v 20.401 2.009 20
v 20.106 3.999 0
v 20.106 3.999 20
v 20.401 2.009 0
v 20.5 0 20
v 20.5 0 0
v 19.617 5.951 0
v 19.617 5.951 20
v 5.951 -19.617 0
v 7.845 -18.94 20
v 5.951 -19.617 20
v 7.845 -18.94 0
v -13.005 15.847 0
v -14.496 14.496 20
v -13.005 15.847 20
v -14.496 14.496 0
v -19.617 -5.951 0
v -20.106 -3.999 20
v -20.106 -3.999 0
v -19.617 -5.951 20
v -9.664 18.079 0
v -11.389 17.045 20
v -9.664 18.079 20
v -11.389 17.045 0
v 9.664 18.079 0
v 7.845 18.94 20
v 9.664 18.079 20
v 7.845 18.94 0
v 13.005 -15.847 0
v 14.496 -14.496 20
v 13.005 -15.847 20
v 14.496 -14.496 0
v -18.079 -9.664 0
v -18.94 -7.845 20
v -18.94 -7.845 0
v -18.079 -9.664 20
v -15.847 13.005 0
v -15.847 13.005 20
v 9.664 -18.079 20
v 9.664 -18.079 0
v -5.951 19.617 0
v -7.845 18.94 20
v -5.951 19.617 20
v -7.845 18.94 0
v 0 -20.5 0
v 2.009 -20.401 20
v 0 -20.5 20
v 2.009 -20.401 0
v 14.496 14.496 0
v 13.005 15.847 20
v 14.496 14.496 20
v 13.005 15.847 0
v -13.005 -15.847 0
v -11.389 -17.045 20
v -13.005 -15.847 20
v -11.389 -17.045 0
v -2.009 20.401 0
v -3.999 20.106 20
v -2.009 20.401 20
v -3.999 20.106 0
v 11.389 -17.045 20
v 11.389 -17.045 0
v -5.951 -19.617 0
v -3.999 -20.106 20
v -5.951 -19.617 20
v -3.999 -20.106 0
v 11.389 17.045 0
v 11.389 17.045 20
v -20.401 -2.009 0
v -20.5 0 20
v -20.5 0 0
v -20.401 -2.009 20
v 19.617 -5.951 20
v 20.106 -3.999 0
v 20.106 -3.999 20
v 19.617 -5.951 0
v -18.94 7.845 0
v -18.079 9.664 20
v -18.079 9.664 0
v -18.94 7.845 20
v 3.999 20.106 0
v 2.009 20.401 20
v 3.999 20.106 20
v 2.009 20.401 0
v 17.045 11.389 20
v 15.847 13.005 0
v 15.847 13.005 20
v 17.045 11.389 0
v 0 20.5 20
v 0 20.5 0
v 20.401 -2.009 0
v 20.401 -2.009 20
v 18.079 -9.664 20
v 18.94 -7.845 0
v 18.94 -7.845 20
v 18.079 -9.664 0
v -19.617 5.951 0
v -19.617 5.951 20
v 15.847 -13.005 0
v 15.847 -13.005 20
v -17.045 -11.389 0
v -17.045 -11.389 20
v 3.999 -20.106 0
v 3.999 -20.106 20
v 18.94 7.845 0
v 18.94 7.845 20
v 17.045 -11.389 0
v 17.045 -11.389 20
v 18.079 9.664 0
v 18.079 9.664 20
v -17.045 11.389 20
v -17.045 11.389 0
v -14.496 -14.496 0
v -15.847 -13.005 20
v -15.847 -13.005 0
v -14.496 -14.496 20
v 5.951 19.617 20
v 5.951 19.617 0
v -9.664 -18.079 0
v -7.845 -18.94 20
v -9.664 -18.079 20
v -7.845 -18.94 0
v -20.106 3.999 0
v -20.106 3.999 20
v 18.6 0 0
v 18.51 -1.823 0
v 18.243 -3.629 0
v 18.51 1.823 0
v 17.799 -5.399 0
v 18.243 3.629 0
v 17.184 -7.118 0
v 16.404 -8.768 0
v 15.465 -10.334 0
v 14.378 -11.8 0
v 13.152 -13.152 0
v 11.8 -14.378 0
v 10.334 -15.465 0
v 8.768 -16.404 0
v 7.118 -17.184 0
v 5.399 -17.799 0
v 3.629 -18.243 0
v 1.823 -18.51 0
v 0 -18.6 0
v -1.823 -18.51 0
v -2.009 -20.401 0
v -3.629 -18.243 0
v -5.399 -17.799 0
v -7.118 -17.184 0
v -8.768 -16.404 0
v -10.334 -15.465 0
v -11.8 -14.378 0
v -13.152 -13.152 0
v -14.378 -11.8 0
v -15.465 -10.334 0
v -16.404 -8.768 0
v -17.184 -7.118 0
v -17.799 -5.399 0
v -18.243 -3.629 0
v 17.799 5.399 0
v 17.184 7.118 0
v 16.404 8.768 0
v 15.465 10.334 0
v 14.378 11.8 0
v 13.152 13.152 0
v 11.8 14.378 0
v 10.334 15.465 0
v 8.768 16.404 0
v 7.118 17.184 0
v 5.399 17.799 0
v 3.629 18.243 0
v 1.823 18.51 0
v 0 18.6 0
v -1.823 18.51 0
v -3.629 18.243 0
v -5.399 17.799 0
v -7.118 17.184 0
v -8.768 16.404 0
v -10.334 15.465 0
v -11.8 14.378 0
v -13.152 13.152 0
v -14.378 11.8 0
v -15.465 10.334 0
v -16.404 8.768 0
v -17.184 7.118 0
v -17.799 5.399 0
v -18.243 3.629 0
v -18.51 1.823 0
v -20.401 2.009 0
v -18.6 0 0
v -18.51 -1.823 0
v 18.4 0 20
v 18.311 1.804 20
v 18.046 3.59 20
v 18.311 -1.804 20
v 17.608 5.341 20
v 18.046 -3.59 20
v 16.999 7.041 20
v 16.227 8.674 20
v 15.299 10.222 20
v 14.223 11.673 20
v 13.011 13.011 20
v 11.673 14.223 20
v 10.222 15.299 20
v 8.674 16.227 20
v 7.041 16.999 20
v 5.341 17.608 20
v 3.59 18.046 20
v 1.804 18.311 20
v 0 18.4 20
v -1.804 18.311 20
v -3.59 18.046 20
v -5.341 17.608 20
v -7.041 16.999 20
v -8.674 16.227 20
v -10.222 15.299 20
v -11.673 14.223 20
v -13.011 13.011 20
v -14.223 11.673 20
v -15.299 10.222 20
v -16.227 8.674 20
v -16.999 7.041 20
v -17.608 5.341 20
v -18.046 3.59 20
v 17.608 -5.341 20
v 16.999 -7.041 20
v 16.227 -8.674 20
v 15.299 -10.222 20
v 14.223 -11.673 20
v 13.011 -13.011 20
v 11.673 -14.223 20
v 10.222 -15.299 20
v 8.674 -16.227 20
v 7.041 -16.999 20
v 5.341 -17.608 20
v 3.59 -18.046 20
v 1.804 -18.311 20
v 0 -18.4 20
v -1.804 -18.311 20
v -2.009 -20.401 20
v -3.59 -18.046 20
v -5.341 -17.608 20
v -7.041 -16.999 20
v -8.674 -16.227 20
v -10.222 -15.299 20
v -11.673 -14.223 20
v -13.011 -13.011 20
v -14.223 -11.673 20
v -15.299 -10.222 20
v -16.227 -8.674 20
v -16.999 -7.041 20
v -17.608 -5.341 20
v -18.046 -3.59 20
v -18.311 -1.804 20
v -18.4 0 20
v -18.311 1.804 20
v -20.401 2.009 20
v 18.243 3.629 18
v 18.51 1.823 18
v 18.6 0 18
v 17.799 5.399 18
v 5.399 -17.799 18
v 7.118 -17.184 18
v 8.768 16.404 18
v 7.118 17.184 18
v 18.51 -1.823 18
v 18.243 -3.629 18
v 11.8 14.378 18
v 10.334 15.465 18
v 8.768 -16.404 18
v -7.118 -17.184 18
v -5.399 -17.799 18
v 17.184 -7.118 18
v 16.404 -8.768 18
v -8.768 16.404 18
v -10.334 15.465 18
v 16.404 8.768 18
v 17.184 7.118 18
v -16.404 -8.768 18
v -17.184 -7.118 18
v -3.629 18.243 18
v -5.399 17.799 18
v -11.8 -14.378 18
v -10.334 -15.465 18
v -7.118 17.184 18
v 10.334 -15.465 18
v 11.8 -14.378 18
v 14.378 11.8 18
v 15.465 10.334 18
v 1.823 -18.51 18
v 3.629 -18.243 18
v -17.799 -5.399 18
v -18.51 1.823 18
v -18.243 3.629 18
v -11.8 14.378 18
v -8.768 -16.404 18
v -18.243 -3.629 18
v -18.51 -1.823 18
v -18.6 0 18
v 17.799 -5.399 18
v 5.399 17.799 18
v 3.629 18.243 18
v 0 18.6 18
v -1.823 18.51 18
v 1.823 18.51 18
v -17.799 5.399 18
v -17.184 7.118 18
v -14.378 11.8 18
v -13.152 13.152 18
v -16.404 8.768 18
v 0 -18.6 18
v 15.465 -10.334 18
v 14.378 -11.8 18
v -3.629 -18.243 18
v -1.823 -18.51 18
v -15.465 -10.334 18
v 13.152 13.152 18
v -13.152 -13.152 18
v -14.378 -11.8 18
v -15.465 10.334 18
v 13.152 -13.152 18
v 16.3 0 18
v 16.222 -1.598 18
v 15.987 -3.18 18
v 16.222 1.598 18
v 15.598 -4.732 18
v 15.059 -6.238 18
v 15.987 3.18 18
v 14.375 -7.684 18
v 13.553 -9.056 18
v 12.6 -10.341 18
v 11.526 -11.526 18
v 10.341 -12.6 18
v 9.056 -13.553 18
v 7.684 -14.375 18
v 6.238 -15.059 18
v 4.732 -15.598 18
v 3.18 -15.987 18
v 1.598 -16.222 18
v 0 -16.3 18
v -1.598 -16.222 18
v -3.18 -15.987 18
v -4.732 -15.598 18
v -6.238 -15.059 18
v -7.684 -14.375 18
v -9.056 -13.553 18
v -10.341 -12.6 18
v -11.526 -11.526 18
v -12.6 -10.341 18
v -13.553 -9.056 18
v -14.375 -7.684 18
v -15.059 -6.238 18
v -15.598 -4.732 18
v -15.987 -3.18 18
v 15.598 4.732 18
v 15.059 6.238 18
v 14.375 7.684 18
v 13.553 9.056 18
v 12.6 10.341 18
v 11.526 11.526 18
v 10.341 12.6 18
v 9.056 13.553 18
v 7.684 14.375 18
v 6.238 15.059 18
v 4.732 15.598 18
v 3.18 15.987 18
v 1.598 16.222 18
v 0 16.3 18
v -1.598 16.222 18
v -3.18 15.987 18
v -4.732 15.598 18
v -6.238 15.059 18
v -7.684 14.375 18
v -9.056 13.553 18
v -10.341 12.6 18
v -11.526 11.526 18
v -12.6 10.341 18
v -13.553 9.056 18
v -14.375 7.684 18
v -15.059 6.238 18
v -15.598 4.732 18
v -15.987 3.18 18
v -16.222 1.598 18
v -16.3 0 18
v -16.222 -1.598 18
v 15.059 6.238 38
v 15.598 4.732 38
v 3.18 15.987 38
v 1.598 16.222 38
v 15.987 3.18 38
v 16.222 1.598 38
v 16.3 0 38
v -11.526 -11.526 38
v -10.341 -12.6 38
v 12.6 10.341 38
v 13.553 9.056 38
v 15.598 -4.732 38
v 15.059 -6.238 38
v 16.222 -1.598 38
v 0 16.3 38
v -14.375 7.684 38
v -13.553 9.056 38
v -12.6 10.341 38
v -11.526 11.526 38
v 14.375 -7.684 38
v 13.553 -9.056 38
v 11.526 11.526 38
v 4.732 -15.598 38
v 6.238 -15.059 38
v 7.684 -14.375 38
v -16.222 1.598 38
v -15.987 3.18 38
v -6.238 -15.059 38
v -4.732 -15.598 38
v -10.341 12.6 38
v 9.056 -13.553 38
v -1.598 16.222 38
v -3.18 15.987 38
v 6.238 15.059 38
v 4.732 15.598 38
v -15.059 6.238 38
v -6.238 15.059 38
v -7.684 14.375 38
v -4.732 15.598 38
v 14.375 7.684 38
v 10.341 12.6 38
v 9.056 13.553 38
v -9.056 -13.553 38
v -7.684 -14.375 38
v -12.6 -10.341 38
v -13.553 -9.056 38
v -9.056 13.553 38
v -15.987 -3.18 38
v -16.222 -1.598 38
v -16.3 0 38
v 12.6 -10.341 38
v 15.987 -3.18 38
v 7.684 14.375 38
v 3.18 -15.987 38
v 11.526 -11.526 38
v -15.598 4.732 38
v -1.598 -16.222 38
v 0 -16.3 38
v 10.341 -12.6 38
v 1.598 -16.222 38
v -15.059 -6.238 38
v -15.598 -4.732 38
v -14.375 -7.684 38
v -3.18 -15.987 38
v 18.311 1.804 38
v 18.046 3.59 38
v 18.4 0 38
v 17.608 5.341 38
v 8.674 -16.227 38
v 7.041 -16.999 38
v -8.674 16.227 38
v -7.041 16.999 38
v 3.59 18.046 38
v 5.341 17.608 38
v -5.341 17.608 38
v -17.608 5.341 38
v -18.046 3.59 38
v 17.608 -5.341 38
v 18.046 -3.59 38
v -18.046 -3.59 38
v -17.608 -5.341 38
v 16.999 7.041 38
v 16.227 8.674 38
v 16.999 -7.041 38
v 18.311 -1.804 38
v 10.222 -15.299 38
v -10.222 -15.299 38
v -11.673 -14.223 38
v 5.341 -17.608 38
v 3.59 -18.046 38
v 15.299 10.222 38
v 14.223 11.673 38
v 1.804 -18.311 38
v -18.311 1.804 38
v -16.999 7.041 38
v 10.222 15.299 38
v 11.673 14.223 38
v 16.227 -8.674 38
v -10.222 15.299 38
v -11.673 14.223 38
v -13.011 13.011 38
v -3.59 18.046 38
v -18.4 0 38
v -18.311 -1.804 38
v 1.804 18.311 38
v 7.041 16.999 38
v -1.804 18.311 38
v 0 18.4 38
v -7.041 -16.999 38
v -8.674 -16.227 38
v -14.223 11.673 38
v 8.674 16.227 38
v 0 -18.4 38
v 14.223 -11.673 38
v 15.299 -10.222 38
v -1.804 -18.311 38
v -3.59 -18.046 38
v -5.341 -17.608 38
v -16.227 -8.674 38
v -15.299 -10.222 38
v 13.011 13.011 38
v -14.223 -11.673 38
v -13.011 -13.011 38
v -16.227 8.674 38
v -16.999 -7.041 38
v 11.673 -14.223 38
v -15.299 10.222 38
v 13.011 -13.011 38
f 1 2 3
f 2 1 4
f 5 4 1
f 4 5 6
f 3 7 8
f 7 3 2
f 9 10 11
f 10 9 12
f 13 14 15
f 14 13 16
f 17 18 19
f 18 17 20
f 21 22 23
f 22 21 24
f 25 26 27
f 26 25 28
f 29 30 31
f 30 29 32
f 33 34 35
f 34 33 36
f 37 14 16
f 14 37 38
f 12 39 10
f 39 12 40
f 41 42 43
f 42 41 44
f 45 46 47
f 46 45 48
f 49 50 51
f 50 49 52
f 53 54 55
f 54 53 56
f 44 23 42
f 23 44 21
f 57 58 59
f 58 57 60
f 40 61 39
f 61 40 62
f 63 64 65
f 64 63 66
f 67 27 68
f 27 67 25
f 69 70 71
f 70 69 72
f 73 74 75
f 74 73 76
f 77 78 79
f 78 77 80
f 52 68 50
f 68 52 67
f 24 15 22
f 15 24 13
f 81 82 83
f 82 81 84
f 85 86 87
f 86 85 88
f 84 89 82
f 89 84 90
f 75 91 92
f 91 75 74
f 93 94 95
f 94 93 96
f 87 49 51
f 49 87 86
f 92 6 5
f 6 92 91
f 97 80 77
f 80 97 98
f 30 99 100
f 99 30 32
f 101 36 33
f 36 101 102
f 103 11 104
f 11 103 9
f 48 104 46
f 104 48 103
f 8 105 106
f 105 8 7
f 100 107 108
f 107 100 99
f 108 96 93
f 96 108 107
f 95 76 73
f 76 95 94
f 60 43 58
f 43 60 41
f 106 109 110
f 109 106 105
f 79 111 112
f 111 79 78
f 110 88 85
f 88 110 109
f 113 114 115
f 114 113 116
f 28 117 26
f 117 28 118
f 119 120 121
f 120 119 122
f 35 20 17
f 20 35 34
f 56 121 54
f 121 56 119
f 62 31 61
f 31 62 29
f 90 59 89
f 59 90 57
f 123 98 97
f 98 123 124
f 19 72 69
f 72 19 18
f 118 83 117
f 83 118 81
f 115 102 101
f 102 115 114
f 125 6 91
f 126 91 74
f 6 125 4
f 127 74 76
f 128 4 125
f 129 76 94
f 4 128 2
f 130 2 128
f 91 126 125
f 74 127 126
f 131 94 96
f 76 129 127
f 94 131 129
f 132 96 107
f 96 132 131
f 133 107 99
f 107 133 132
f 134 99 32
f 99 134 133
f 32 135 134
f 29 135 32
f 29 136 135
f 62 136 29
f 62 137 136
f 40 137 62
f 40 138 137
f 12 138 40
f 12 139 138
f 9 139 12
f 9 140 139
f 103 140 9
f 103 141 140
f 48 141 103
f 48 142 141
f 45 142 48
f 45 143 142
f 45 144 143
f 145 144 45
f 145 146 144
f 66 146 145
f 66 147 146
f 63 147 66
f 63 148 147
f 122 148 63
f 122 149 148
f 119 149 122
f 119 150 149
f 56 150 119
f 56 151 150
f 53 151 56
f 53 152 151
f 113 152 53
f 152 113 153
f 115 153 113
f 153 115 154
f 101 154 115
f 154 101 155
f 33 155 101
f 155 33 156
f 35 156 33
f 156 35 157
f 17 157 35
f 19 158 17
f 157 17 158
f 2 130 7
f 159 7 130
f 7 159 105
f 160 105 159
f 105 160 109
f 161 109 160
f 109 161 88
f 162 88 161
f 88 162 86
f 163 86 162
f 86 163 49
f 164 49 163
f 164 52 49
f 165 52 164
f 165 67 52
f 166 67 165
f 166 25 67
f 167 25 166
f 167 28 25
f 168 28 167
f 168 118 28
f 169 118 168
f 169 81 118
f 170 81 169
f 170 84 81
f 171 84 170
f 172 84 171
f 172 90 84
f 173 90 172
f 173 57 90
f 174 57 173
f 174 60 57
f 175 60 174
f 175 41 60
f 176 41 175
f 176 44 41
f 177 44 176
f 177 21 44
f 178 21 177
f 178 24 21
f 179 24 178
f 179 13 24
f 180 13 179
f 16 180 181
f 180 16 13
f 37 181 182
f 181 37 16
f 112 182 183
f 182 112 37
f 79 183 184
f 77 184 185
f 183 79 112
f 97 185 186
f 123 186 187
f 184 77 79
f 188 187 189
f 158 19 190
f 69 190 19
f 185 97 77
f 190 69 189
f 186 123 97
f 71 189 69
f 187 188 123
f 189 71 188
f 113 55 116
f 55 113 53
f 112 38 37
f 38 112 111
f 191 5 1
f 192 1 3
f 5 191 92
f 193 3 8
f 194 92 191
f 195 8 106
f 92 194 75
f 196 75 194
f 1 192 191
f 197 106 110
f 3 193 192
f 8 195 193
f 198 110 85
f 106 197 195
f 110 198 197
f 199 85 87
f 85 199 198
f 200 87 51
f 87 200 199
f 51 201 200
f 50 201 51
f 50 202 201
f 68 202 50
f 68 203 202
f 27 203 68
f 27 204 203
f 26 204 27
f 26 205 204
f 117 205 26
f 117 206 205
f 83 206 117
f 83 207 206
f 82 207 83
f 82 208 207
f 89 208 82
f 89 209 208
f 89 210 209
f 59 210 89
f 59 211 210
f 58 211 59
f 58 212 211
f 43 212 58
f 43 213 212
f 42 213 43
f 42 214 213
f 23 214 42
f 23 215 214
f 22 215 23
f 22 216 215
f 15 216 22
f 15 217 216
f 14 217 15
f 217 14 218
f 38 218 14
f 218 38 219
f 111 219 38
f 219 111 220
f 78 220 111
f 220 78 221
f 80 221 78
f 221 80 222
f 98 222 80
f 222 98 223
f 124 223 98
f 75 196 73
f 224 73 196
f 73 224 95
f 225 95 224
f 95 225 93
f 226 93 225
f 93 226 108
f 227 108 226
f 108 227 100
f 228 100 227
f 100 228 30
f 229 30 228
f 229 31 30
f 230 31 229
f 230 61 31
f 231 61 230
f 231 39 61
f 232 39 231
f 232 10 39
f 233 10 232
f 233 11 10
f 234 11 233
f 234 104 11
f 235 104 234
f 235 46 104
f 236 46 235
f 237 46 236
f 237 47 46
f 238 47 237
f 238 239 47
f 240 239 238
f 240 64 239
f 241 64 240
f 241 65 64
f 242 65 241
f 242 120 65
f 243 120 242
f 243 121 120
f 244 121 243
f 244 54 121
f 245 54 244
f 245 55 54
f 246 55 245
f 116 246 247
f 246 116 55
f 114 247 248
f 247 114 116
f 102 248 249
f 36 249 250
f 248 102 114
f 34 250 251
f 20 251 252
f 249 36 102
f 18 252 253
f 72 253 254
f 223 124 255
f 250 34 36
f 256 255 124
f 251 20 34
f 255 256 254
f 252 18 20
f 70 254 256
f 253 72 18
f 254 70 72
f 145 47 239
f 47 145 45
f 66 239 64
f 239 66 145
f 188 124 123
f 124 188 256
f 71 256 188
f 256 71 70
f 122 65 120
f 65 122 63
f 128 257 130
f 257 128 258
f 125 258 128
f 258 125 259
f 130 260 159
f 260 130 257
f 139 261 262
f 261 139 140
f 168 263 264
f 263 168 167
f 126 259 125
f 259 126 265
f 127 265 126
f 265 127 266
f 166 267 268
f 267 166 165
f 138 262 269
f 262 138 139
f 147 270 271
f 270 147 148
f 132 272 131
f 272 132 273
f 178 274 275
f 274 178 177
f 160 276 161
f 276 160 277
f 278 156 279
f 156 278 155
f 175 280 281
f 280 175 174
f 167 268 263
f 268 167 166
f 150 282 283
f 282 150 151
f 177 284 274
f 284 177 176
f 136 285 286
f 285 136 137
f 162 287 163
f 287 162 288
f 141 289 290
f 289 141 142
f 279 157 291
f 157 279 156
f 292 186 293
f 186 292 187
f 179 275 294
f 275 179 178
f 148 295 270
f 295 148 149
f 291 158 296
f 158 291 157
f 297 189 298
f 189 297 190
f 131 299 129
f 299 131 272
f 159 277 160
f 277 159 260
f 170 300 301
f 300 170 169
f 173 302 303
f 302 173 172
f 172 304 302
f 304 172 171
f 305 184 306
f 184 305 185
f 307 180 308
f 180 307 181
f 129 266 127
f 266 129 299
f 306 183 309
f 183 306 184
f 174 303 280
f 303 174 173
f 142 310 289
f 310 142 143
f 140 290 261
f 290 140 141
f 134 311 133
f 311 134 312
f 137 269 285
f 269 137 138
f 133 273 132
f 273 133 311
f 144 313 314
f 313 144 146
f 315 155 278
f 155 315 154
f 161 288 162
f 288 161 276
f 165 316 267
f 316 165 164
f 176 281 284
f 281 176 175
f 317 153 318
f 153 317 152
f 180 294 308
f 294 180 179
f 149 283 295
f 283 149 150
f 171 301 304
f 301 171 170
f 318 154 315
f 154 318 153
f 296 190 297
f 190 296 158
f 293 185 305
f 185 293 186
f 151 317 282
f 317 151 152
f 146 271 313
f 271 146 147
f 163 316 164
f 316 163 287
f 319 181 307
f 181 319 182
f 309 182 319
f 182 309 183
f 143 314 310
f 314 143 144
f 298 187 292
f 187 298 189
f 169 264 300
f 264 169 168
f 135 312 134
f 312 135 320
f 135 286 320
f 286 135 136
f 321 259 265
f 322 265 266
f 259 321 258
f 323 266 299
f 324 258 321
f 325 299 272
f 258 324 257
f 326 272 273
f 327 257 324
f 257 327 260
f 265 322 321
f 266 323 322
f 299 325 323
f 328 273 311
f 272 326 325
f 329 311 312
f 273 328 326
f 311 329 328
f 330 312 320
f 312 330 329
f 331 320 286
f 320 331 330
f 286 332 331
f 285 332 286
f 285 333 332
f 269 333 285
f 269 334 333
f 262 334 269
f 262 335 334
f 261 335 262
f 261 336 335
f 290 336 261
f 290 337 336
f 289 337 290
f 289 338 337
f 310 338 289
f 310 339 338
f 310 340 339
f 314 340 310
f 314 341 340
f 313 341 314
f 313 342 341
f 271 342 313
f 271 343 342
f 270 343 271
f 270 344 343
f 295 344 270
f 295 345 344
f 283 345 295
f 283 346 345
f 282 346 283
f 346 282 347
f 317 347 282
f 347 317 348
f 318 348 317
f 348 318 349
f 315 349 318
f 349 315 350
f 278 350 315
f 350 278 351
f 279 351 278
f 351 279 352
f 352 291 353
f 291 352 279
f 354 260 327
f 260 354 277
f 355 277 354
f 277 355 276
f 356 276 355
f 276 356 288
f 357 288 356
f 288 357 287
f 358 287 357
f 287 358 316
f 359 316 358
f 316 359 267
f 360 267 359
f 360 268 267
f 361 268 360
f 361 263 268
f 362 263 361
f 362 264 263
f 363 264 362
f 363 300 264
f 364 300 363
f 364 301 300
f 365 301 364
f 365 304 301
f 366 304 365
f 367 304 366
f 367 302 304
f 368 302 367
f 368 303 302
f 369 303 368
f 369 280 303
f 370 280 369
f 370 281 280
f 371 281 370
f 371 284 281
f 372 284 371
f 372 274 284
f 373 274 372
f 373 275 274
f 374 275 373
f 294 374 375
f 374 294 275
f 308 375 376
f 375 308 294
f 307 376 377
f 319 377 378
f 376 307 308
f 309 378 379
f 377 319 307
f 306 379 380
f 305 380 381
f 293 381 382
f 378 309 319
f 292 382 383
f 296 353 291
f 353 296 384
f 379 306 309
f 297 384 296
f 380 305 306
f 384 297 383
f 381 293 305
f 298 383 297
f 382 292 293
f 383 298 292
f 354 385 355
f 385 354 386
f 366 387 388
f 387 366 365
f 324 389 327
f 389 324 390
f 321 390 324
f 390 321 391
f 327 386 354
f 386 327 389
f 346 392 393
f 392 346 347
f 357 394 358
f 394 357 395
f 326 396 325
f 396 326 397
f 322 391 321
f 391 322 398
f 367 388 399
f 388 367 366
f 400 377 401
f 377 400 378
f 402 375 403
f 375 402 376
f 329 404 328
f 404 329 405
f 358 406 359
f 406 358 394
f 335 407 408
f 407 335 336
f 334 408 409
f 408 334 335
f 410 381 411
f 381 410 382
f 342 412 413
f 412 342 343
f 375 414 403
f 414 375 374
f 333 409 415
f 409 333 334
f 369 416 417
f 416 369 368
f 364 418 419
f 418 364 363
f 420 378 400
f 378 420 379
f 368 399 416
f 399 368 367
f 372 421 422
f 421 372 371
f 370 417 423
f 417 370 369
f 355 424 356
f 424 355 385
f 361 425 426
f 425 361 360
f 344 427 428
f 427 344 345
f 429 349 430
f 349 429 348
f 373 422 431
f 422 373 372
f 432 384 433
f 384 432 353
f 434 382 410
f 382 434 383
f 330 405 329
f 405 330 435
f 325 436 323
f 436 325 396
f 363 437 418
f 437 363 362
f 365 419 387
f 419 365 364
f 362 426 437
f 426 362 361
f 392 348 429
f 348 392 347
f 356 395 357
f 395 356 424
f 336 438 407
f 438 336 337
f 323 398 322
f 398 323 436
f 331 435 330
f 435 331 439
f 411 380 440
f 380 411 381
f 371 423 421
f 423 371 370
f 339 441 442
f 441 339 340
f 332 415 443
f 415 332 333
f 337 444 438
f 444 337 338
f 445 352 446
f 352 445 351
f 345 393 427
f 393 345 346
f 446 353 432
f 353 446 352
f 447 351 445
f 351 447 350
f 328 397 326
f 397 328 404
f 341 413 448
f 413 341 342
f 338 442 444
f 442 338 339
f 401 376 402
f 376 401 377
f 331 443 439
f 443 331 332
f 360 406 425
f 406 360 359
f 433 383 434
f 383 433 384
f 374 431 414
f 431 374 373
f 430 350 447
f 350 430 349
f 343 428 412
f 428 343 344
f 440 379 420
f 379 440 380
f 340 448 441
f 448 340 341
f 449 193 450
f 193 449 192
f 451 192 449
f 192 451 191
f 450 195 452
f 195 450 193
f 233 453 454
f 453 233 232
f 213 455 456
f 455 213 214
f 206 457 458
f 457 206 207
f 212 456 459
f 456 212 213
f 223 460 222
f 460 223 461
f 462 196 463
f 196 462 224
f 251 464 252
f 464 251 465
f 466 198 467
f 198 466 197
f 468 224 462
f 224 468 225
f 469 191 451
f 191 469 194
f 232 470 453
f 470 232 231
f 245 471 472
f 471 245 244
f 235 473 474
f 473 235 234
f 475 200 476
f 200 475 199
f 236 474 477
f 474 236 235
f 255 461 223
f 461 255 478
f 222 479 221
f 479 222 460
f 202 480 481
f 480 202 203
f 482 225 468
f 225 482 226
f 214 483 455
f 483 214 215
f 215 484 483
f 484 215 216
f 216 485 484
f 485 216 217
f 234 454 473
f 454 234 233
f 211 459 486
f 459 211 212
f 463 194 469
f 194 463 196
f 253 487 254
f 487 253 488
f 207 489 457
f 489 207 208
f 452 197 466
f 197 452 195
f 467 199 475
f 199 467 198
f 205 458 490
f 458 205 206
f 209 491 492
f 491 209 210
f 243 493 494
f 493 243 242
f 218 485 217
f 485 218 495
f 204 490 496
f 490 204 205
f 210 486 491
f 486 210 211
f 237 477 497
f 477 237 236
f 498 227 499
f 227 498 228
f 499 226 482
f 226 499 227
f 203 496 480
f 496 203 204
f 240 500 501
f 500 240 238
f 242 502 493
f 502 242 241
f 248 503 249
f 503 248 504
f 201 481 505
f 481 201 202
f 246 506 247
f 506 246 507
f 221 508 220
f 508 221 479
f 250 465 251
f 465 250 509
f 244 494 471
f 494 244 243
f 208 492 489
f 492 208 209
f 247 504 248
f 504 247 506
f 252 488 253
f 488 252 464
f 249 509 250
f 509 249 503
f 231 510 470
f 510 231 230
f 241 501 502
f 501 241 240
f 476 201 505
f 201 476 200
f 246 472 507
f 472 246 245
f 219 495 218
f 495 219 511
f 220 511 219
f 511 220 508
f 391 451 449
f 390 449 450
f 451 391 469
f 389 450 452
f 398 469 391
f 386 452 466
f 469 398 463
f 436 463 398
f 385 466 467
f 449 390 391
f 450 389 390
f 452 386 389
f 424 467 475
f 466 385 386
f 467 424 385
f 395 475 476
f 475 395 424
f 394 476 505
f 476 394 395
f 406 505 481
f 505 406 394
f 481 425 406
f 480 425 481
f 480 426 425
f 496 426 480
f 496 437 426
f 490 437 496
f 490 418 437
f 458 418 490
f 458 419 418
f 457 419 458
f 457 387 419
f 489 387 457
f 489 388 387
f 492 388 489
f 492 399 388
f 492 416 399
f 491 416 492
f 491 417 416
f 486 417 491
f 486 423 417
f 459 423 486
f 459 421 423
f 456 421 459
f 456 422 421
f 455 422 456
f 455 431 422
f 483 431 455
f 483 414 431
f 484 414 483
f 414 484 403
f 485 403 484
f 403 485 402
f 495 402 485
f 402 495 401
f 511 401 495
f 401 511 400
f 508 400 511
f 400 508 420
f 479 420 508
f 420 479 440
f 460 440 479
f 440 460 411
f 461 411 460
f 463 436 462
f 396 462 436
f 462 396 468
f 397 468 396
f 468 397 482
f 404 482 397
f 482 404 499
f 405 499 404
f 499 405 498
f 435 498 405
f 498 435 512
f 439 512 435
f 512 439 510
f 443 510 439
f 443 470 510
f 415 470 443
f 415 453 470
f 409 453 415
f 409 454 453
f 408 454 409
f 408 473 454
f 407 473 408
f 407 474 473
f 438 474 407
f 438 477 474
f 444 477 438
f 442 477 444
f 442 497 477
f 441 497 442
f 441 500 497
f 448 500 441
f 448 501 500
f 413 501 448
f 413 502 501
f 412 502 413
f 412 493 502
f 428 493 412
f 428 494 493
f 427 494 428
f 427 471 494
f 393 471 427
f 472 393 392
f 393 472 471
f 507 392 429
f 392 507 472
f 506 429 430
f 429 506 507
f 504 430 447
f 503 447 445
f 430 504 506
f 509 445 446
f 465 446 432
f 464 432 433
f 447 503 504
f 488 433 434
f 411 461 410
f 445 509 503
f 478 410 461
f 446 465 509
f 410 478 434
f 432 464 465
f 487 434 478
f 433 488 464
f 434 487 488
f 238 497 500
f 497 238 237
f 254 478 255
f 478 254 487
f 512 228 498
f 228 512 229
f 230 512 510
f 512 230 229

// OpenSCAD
$base_heigth = 20;

$base_outer_diameter = 20.5;
$base_inner_diameter = 18.6;

$top_heigth = 18;
$top_outer_diameter = 18.4;
$top_inner_diameter = 16.3;

$toal_heigth = $base_heigth + $top_heigth;

$min_base_heigth = 18;

if($base_heigth < $min_base_heigth) {
    $base_heigth = $min_base_heigth;
}


$fn = 64;

union() {
    difference() {
        cylinder(h = $base_heigth, r = $base_outer_diameter);
        cylinder(h = $base_heigth, r = $base_inner_diameter);
    }
    
    difference() {
        translate([0, 0, $base_heigth - 2]) cylinder(h = 2, r = $base_inner_diameter);
        translate([0, 0, $base_heigth - 2]) cylinder(h = 2, r = $top_inner_diameter);
    }
    
    translate([0, 0, $base_heigth]) difference() {
        cylinder(h = $top_heigth, r = $top_outer_diameter);
        cylinder(h = $top_heigth, r = $top_inner_diameter);
    }
    
}
